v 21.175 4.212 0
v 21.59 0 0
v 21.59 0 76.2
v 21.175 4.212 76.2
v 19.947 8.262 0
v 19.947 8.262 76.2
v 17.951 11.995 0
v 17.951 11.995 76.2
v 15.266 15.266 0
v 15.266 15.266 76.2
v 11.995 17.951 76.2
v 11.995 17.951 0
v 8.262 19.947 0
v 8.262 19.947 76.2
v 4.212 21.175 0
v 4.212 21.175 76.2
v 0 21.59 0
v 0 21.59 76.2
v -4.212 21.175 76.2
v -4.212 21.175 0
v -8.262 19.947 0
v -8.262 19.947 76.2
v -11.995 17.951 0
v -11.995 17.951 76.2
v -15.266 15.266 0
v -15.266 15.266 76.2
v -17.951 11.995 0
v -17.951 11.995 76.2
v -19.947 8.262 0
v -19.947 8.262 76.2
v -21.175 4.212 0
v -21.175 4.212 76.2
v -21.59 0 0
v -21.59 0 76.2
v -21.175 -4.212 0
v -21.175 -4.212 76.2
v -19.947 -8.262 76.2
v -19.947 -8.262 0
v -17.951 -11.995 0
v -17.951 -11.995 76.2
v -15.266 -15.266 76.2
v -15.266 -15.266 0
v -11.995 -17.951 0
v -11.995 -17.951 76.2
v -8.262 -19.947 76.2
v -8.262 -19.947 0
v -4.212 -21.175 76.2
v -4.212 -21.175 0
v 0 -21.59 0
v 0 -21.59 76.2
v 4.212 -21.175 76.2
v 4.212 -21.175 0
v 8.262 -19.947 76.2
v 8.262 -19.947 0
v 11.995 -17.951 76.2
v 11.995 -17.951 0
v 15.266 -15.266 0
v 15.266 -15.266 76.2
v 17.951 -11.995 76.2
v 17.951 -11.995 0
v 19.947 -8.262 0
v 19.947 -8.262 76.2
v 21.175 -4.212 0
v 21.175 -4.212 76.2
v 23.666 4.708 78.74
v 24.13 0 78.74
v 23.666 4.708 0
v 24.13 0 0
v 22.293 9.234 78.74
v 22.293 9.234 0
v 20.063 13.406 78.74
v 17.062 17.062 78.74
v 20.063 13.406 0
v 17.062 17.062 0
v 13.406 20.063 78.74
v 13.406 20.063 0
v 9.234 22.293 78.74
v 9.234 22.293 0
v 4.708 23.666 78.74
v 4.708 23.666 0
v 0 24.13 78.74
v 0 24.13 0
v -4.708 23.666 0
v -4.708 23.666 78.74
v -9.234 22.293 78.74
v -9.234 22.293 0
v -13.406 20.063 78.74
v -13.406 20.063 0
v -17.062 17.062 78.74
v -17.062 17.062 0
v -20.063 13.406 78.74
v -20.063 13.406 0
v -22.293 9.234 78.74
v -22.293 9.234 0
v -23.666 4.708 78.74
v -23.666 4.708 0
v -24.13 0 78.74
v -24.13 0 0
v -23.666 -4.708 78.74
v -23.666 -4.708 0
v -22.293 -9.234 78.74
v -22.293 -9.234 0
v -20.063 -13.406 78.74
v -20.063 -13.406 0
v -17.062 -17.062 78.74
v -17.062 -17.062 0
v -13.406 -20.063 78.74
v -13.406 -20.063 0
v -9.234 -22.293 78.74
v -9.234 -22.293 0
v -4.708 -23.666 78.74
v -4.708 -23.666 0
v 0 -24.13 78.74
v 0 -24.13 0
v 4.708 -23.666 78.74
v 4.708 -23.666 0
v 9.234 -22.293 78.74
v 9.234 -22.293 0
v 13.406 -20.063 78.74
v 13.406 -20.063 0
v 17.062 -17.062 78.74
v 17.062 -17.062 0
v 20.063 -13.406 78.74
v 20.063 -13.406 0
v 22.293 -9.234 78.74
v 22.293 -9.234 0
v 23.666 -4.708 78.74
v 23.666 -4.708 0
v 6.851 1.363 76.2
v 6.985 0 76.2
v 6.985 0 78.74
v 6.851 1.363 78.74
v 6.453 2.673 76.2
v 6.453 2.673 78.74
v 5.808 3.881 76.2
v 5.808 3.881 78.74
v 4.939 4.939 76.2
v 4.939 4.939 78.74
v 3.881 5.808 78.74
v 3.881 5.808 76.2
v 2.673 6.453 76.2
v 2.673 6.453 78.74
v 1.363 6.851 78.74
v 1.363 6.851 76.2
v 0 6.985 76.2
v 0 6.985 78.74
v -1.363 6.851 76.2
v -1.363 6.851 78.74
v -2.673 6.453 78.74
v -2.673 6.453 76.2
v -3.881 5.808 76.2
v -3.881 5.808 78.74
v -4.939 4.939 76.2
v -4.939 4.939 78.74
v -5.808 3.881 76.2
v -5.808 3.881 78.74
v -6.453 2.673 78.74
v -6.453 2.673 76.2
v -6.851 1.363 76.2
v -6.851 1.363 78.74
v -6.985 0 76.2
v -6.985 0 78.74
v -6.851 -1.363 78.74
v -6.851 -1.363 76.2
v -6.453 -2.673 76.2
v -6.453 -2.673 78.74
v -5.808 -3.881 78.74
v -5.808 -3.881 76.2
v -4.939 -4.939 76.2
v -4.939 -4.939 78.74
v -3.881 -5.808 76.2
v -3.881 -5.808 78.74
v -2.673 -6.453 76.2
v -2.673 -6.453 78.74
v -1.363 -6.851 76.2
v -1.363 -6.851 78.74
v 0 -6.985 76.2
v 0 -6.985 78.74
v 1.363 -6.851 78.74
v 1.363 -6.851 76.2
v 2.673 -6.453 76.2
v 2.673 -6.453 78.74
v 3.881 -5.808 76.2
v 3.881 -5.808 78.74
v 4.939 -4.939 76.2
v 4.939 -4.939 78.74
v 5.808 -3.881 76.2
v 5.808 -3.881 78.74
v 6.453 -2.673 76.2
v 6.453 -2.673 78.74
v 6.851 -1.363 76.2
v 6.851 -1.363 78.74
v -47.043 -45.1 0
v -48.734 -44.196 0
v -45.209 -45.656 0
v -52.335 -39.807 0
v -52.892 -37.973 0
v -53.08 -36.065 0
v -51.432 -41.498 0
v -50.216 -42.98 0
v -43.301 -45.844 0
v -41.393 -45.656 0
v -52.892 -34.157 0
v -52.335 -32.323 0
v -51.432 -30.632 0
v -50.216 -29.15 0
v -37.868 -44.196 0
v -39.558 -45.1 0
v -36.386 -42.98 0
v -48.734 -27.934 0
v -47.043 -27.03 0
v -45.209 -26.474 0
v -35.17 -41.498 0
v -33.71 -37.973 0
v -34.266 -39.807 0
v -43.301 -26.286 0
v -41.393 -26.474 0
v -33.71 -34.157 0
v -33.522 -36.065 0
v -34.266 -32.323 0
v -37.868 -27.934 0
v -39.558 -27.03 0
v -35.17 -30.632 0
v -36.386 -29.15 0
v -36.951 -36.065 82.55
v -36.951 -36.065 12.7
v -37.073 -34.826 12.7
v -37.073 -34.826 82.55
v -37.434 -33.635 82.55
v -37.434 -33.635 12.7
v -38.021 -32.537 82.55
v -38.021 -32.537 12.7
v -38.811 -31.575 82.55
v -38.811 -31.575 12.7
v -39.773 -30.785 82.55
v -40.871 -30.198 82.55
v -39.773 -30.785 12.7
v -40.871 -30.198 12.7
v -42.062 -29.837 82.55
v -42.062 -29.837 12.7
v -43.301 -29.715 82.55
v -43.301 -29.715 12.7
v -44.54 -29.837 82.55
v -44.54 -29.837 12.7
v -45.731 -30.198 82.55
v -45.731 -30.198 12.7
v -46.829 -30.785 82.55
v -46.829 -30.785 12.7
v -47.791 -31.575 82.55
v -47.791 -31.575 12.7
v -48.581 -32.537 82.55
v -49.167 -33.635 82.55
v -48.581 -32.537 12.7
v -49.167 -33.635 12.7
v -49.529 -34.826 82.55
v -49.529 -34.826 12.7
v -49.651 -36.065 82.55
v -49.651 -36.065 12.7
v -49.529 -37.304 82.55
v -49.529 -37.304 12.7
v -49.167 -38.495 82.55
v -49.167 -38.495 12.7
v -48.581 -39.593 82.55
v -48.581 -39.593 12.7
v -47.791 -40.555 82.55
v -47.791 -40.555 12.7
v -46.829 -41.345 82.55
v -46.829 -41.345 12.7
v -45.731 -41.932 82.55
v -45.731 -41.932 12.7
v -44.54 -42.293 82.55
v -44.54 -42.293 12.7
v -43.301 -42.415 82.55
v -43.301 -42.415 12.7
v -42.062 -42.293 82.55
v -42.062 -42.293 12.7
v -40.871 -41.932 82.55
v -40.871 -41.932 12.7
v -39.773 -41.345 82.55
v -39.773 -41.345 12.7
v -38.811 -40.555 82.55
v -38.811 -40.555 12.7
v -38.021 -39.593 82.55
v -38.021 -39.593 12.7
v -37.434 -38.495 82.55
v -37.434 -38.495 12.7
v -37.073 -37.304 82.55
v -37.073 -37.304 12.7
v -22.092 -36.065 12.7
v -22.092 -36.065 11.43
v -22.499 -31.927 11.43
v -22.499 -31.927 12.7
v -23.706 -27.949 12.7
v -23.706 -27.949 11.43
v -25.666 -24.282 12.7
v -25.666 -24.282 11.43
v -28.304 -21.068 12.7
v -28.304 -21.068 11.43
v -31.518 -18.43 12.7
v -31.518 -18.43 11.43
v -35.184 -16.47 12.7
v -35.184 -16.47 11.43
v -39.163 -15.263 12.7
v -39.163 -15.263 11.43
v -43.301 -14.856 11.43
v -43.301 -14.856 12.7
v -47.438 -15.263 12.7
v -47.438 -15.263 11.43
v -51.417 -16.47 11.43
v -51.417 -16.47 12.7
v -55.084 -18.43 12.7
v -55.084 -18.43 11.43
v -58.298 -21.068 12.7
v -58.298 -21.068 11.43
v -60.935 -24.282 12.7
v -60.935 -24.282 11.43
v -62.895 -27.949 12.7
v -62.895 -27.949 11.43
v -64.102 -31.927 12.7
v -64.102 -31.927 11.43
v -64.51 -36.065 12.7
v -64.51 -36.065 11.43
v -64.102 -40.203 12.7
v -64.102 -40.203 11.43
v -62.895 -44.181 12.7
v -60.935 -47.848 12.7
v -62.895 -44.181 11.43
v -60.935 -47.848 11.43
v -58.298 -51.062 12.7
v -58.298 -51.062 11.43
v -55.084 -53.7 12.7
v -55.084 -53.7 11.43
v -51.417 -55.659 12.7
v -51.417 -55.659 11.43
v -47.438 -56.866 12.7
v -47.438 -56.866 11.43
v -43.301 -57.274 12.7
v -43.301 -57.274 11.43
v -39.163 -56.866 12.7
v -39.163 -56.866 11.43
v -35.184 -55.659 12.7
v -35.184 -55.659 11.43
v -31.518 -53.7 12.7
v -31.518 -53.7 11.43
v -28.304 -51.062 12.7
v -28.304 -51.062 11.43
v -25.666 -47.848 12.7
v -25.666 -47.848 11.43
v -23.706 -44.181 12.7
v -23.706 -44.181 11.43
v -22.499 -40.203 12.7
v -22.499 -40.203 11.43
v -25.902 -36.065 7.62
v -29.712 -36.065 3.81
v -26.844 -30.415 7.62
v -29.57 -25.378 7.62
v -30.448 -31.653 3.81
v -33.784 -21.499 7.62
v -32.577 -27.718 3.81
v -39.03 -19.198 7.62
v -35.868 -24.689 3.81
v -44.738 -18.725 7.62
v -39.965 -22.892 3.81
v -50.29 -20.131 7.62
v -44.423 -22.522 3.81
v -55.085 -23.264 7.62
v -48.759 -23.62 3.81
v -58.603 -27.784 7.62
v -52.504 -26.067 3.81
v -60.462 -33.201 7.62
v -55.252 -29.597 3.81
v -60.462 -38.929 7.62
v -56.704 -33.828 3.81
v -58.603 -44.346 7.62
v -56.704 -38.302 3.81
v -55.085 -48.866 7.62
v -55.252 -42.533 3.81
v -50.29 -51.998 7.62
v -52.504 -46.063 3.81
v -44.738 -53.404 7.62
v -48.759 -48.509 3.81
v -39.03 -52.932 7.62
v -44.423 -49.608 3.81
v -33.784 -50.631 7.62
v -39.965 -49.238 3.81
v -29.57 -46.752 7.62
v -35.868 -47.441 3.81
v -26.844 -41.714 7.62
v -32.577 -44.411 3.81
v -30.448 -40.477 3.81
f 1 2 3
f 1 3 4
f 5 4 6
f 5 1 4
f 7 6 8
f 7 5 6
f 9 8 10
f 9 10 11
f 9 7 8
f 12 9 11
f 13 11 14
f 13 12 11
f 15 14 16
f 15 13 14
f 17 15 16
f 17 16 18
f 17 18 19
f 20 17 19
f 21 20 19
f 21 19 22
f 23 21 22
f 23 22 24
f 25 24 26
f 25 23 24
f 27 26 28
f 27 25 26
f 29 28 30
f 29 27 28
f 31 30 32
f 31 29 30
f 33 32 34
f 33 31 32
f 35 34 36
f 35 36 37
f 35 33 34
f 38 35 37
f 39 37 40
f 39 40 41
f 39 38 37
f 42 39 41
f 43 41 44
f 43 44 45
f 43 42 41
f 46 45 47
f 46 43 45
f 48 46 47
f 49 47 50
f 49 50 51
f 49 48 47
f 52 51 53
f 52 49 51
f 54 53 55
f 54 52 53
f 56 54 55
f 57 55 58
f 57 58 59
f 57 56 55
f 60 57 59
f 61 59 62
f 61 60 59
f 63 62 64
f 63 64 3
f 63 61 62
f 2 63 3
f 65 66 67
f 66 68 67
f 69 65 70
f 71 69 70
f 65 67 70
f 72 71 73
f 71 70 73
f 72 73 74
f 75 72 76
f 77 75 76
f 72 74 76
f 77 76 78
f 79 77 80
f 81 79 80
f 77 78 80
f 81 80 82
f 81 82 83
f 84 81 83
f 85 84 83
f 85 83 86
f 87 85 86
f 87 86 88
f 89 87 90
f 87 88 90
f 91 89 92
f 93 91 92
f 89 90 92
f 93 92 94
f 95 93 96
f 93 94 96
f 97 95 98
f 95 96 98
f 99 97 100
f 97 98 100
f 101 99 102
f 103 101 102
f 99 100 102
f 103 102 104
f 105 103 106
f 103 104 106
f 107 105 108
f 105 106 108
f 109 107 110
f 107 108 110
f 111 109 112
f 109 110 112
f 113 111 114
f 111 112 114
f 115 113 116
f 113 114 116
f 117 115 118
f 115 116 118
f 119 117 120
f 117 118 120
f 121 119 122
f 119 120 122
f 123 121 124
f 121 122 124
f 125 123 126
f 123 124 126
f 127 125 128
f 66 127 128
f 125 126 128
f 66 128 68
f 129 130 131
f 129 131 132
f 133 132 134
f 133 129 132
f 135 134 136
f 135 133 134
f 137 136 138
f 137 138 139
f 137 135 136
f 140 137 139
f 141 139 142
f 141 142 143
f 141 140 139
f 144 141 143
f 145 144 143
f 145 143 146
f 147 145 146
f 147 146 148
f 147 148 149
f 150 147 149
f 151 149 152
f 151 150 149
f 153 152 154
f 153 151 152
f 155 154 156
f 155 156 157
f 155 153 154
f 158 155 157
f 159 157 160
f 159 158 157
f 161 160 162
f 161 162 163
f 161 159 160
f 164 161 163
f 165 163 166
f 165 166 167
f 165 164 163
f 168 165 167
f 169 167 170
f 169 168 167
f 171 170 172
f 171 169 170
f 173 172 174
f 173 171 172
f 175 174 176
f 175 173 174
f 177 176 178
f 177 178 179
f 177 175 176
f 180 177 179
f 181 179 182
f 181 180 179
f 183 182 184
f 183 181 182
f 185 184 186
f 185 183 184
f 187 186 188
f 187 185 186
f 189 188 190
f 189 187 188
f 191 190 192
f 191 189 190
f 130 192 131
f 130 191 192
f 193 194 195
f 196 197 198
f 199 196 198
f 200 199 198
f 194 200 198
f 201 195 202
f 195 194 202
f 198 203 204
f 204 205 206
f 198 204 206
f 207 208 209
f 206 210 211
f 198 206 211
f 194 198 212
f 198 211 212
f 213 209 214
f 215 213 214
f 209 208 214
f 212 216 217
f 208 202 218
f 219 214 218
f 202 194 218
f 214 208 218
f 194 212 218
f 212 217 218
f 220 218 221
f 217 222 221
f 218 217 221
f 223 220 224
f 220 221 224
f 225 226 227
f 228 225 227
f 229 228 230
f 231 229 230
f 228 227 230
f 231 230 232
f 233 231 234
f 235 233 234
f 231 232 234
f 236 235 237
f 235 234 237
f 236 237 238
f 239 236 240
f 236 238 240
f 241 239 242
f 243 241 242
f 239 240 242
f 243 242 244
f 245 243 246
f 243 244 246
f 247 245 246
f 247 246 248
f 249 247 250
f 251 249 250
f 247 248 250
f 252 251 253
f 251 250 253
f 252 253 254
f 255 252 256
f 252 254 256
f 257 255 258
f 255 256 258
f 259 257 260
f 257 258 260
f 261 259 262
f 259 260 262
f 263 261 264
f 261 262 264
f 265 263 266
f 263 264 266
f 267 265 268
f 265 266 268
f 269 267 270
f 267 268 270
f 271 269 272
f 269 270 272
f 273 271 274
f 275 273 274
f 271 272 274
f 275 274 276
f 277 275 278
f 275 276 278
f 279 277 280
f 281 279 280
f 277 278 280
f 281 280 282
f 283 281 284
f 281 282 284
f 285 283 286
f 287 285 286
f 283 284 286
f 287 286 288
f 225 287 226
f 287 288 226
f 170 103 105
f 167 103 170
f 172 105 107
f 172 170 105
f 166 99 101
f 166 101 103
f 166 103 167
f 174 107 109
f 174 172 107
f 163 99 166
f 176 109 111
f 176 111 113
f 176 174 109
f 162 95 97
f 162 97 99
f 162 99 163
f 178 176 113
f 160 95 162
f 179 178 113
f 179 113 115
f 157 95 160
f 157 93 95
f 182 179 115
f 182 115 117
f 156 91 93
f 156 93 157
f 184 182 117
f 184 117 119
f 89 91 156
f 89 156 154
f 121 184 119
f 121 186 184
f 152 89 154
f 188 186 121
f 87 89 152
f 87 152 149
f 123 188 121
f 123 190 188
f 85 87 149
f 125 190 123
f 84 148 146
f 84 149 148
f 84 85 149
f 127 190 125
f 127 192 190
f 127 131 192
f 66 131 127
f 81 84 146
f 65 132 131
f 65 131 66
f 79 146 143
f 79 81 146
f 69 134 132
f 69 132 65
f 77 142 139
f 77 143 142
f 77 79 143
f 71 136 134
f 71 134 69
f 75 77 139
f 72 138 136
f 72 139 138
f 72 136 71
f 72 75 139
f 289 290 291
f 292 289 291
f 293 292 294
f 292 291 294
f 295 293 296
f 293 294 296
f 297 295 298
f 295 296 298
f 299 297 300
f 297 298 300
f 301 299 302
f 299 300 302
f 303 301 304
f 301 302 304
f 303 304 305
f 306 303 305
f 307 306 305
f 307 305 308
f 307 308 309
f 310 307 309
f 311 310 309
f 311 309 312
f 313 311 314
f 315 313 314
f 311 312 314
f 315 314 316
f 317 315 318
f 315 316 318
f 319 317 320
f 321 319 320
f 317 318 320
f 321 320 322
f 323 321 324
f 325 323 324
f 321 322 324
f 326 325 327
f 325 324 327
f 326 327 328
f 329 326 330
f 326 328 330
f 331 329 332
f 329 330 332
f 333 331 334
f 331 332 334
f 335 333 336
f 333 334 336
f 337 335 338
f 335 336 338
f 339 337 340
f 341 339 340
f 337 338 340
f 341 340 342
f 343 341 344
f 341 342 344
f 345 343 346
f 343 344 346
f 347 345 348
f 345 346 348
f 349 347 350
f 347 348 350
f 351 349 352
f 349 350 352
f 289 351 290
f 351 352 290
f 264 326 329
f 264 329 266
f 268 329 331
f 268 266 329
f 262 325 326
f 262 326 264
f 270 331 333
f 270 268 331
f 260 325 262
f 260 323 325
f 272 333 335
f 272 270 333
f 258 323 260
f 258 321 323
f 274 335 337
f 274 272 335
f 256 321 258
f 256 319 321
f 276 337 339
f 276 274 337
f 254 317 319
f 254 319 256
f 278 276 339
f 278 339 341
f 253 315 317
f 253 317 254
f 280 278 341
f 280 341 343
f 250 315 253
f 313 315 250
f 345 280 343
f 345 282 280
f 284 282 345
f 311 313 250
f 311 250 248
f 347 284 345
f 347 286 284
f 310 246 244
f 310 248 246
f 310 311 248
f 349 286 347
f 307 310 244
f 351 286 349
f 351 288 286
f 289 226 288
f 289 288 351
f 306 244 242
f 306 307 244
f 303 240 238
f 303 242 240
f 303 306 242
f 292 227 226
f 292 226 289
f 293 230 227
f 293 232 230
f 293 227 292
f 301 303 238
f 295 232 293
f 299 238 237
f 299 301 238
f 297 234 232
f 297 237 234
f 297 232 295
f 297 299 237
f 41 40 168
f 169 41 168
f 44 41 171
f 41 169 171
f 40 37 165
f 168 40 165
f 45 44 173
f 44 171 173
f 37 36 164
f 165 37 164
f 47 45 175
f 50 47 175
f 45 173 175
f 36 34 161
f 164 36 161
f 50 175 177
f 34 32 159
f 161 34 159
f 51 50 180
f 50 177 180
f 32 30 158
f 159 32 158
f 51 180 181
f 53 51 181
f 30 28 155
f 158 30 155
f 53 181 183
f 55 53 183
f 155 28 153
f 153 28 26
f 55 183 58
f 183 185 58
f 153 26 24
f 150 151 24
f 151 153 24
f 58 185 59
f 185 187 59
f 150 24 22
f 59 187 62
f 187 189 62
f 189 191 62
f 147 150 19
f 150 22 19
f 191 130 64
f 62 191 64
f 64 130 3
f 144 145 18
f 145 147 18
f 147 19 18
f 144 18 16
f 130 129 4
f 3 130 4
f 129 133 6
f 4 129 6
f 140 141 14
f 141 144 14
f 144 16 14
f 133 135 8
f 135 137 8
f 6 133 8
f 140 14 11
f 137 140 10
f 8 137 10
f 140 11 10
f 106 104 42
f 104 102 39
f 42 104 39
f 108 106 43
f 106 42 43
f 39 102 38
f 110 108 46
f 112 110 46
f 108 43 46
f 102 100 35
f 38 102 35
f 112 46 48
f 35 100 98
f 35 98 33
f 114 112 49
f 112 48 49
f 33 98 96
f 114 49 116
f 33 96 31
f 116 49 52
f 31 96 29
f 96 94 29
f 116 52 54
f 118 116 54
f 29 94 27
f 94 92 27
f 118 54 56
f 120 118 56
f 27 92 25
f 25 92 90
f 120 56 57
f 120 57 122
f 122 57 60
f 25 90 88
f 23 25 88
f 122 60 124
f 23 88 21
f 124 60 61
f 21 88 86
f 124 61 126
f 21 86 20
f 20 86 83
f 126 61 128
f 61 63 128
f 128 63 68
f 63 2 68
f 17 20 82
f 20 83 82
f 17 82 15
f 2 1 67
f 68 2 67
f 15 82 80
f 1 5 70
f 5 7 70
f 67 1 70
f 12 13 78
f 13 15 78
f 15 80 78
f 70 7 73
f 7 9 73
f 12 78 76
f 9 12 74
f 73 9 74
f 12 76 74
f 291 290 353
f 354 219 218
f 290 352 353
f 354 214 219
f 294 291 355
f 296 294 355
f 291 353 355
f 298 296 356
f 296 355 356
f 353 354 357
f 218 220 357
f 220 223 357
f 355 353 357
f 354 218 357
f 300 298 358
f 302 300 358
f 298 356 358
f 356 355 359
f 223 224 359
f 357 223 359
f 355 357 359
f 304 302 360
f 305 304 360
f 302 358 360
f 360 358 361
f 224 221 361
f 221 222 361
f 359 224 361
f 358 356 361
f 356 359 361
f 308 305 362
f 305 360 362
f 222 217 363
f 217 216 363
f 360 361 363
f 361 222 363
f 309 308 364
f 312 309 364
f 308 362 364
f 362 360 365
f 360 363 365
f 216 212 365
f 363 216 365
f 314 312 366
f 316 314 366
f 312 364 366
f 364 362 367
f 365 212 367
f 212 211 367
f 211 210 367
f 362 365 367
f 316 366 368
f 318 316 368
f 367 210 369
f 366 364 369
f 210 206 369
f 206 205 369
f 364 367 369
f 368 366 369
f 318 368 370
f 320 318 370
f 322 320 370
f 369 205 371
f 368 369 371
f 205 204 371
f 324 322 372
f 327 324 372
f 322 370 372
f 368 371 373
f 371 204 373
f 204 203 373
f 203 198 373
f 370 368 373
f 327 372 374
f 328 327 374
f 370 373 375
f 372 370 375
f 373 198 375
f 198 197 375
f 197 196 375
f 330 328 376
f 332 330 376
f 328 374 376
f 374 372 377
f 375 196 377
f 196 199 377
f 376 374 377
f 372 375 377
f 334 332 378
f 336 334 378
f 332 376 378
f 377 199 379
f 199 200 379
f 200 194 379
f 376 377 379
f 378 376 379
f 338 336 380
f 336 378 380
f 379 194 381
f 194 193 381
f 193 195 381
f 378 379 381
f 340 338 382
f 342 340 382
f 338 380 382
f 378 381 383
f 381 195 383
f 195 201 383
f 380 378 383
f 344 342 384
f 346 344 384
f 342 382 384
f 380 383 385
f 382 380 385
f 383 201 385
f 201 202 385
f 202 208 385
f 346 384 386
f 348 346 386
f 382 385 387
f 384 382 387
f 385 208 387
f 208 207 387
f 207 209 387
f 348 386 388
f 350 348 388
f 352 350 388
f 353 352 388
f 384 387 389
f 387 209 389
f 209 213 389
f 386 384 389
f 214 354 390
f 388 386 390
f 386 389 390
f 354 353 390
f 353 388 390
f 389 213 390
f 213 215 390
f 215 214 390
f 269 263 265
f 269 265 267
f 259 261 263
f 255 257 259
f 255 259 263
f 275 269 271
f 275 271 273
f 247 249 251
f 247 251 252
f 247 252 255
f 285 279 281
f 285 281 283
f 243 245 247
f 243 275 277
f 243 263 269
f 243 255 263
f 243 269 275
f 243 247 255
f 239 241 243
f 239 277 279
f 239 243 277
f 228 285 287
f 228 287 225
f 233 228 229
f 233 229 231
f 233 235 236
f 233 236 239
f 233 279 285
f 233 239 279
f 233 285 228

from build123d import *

# Parameters (mm, degrees)
F0_R     = 24.13
F0_R_2   = 21.59
F1_DEPTH = 76.2
F2_R     = 21.209
F3_DEPTH = 12.7
F4_SIZE  = 11.43
F5_R     = 6.35
F6_DEPTH = 69.85
F7_R     = 24.13
F7_R_2   = 6.985
F8_DEPTH = 2.54


with BuildPart() as f1:
    # F0 (on Top) → F1 (new body)
    with BuildSketch(Plane.XY):
        Circle(F0_R)
        Circle(F0_R_2, mode=Mode.SUBTRACT)
    extrude(amount=F1_DEPTH)

    # F7 (on face) → F8 (join)
    with BuildSketch(Plane.XY.offset(76.2)):
        Circle(F7_R)
        Circle(F7_R_2, mode=Mode.SUBTRACT)
    extrude(amount=F8_DEPTH)


with BuildPart() as f3:
    # F2 (on Top) → F3 (new body)
    with BuildSketch(Plane.XY):
        with Locations((-43.300729, -36.064915)):
            Circle(F2_R)
    extrude(amount=F3_DEPTH)

    # F4
    f4_edges = [f3.edges().sort_by_distance(p)[0] for p in [
        (-64.509729, -36.064915, 0),
    ]]
    chamfer(f4_edges, length=F4_SIZE)

    # F5 (on face) → F6 (join)
    with BuildSketch(Plane.XY.offset(12.7)):
        with Locations((-43.300729, -36.064915)):
            Circle(F5_R)
    extrude(amount=F6_DEPTH)


solid = Compound([f1.part, f3.part])
